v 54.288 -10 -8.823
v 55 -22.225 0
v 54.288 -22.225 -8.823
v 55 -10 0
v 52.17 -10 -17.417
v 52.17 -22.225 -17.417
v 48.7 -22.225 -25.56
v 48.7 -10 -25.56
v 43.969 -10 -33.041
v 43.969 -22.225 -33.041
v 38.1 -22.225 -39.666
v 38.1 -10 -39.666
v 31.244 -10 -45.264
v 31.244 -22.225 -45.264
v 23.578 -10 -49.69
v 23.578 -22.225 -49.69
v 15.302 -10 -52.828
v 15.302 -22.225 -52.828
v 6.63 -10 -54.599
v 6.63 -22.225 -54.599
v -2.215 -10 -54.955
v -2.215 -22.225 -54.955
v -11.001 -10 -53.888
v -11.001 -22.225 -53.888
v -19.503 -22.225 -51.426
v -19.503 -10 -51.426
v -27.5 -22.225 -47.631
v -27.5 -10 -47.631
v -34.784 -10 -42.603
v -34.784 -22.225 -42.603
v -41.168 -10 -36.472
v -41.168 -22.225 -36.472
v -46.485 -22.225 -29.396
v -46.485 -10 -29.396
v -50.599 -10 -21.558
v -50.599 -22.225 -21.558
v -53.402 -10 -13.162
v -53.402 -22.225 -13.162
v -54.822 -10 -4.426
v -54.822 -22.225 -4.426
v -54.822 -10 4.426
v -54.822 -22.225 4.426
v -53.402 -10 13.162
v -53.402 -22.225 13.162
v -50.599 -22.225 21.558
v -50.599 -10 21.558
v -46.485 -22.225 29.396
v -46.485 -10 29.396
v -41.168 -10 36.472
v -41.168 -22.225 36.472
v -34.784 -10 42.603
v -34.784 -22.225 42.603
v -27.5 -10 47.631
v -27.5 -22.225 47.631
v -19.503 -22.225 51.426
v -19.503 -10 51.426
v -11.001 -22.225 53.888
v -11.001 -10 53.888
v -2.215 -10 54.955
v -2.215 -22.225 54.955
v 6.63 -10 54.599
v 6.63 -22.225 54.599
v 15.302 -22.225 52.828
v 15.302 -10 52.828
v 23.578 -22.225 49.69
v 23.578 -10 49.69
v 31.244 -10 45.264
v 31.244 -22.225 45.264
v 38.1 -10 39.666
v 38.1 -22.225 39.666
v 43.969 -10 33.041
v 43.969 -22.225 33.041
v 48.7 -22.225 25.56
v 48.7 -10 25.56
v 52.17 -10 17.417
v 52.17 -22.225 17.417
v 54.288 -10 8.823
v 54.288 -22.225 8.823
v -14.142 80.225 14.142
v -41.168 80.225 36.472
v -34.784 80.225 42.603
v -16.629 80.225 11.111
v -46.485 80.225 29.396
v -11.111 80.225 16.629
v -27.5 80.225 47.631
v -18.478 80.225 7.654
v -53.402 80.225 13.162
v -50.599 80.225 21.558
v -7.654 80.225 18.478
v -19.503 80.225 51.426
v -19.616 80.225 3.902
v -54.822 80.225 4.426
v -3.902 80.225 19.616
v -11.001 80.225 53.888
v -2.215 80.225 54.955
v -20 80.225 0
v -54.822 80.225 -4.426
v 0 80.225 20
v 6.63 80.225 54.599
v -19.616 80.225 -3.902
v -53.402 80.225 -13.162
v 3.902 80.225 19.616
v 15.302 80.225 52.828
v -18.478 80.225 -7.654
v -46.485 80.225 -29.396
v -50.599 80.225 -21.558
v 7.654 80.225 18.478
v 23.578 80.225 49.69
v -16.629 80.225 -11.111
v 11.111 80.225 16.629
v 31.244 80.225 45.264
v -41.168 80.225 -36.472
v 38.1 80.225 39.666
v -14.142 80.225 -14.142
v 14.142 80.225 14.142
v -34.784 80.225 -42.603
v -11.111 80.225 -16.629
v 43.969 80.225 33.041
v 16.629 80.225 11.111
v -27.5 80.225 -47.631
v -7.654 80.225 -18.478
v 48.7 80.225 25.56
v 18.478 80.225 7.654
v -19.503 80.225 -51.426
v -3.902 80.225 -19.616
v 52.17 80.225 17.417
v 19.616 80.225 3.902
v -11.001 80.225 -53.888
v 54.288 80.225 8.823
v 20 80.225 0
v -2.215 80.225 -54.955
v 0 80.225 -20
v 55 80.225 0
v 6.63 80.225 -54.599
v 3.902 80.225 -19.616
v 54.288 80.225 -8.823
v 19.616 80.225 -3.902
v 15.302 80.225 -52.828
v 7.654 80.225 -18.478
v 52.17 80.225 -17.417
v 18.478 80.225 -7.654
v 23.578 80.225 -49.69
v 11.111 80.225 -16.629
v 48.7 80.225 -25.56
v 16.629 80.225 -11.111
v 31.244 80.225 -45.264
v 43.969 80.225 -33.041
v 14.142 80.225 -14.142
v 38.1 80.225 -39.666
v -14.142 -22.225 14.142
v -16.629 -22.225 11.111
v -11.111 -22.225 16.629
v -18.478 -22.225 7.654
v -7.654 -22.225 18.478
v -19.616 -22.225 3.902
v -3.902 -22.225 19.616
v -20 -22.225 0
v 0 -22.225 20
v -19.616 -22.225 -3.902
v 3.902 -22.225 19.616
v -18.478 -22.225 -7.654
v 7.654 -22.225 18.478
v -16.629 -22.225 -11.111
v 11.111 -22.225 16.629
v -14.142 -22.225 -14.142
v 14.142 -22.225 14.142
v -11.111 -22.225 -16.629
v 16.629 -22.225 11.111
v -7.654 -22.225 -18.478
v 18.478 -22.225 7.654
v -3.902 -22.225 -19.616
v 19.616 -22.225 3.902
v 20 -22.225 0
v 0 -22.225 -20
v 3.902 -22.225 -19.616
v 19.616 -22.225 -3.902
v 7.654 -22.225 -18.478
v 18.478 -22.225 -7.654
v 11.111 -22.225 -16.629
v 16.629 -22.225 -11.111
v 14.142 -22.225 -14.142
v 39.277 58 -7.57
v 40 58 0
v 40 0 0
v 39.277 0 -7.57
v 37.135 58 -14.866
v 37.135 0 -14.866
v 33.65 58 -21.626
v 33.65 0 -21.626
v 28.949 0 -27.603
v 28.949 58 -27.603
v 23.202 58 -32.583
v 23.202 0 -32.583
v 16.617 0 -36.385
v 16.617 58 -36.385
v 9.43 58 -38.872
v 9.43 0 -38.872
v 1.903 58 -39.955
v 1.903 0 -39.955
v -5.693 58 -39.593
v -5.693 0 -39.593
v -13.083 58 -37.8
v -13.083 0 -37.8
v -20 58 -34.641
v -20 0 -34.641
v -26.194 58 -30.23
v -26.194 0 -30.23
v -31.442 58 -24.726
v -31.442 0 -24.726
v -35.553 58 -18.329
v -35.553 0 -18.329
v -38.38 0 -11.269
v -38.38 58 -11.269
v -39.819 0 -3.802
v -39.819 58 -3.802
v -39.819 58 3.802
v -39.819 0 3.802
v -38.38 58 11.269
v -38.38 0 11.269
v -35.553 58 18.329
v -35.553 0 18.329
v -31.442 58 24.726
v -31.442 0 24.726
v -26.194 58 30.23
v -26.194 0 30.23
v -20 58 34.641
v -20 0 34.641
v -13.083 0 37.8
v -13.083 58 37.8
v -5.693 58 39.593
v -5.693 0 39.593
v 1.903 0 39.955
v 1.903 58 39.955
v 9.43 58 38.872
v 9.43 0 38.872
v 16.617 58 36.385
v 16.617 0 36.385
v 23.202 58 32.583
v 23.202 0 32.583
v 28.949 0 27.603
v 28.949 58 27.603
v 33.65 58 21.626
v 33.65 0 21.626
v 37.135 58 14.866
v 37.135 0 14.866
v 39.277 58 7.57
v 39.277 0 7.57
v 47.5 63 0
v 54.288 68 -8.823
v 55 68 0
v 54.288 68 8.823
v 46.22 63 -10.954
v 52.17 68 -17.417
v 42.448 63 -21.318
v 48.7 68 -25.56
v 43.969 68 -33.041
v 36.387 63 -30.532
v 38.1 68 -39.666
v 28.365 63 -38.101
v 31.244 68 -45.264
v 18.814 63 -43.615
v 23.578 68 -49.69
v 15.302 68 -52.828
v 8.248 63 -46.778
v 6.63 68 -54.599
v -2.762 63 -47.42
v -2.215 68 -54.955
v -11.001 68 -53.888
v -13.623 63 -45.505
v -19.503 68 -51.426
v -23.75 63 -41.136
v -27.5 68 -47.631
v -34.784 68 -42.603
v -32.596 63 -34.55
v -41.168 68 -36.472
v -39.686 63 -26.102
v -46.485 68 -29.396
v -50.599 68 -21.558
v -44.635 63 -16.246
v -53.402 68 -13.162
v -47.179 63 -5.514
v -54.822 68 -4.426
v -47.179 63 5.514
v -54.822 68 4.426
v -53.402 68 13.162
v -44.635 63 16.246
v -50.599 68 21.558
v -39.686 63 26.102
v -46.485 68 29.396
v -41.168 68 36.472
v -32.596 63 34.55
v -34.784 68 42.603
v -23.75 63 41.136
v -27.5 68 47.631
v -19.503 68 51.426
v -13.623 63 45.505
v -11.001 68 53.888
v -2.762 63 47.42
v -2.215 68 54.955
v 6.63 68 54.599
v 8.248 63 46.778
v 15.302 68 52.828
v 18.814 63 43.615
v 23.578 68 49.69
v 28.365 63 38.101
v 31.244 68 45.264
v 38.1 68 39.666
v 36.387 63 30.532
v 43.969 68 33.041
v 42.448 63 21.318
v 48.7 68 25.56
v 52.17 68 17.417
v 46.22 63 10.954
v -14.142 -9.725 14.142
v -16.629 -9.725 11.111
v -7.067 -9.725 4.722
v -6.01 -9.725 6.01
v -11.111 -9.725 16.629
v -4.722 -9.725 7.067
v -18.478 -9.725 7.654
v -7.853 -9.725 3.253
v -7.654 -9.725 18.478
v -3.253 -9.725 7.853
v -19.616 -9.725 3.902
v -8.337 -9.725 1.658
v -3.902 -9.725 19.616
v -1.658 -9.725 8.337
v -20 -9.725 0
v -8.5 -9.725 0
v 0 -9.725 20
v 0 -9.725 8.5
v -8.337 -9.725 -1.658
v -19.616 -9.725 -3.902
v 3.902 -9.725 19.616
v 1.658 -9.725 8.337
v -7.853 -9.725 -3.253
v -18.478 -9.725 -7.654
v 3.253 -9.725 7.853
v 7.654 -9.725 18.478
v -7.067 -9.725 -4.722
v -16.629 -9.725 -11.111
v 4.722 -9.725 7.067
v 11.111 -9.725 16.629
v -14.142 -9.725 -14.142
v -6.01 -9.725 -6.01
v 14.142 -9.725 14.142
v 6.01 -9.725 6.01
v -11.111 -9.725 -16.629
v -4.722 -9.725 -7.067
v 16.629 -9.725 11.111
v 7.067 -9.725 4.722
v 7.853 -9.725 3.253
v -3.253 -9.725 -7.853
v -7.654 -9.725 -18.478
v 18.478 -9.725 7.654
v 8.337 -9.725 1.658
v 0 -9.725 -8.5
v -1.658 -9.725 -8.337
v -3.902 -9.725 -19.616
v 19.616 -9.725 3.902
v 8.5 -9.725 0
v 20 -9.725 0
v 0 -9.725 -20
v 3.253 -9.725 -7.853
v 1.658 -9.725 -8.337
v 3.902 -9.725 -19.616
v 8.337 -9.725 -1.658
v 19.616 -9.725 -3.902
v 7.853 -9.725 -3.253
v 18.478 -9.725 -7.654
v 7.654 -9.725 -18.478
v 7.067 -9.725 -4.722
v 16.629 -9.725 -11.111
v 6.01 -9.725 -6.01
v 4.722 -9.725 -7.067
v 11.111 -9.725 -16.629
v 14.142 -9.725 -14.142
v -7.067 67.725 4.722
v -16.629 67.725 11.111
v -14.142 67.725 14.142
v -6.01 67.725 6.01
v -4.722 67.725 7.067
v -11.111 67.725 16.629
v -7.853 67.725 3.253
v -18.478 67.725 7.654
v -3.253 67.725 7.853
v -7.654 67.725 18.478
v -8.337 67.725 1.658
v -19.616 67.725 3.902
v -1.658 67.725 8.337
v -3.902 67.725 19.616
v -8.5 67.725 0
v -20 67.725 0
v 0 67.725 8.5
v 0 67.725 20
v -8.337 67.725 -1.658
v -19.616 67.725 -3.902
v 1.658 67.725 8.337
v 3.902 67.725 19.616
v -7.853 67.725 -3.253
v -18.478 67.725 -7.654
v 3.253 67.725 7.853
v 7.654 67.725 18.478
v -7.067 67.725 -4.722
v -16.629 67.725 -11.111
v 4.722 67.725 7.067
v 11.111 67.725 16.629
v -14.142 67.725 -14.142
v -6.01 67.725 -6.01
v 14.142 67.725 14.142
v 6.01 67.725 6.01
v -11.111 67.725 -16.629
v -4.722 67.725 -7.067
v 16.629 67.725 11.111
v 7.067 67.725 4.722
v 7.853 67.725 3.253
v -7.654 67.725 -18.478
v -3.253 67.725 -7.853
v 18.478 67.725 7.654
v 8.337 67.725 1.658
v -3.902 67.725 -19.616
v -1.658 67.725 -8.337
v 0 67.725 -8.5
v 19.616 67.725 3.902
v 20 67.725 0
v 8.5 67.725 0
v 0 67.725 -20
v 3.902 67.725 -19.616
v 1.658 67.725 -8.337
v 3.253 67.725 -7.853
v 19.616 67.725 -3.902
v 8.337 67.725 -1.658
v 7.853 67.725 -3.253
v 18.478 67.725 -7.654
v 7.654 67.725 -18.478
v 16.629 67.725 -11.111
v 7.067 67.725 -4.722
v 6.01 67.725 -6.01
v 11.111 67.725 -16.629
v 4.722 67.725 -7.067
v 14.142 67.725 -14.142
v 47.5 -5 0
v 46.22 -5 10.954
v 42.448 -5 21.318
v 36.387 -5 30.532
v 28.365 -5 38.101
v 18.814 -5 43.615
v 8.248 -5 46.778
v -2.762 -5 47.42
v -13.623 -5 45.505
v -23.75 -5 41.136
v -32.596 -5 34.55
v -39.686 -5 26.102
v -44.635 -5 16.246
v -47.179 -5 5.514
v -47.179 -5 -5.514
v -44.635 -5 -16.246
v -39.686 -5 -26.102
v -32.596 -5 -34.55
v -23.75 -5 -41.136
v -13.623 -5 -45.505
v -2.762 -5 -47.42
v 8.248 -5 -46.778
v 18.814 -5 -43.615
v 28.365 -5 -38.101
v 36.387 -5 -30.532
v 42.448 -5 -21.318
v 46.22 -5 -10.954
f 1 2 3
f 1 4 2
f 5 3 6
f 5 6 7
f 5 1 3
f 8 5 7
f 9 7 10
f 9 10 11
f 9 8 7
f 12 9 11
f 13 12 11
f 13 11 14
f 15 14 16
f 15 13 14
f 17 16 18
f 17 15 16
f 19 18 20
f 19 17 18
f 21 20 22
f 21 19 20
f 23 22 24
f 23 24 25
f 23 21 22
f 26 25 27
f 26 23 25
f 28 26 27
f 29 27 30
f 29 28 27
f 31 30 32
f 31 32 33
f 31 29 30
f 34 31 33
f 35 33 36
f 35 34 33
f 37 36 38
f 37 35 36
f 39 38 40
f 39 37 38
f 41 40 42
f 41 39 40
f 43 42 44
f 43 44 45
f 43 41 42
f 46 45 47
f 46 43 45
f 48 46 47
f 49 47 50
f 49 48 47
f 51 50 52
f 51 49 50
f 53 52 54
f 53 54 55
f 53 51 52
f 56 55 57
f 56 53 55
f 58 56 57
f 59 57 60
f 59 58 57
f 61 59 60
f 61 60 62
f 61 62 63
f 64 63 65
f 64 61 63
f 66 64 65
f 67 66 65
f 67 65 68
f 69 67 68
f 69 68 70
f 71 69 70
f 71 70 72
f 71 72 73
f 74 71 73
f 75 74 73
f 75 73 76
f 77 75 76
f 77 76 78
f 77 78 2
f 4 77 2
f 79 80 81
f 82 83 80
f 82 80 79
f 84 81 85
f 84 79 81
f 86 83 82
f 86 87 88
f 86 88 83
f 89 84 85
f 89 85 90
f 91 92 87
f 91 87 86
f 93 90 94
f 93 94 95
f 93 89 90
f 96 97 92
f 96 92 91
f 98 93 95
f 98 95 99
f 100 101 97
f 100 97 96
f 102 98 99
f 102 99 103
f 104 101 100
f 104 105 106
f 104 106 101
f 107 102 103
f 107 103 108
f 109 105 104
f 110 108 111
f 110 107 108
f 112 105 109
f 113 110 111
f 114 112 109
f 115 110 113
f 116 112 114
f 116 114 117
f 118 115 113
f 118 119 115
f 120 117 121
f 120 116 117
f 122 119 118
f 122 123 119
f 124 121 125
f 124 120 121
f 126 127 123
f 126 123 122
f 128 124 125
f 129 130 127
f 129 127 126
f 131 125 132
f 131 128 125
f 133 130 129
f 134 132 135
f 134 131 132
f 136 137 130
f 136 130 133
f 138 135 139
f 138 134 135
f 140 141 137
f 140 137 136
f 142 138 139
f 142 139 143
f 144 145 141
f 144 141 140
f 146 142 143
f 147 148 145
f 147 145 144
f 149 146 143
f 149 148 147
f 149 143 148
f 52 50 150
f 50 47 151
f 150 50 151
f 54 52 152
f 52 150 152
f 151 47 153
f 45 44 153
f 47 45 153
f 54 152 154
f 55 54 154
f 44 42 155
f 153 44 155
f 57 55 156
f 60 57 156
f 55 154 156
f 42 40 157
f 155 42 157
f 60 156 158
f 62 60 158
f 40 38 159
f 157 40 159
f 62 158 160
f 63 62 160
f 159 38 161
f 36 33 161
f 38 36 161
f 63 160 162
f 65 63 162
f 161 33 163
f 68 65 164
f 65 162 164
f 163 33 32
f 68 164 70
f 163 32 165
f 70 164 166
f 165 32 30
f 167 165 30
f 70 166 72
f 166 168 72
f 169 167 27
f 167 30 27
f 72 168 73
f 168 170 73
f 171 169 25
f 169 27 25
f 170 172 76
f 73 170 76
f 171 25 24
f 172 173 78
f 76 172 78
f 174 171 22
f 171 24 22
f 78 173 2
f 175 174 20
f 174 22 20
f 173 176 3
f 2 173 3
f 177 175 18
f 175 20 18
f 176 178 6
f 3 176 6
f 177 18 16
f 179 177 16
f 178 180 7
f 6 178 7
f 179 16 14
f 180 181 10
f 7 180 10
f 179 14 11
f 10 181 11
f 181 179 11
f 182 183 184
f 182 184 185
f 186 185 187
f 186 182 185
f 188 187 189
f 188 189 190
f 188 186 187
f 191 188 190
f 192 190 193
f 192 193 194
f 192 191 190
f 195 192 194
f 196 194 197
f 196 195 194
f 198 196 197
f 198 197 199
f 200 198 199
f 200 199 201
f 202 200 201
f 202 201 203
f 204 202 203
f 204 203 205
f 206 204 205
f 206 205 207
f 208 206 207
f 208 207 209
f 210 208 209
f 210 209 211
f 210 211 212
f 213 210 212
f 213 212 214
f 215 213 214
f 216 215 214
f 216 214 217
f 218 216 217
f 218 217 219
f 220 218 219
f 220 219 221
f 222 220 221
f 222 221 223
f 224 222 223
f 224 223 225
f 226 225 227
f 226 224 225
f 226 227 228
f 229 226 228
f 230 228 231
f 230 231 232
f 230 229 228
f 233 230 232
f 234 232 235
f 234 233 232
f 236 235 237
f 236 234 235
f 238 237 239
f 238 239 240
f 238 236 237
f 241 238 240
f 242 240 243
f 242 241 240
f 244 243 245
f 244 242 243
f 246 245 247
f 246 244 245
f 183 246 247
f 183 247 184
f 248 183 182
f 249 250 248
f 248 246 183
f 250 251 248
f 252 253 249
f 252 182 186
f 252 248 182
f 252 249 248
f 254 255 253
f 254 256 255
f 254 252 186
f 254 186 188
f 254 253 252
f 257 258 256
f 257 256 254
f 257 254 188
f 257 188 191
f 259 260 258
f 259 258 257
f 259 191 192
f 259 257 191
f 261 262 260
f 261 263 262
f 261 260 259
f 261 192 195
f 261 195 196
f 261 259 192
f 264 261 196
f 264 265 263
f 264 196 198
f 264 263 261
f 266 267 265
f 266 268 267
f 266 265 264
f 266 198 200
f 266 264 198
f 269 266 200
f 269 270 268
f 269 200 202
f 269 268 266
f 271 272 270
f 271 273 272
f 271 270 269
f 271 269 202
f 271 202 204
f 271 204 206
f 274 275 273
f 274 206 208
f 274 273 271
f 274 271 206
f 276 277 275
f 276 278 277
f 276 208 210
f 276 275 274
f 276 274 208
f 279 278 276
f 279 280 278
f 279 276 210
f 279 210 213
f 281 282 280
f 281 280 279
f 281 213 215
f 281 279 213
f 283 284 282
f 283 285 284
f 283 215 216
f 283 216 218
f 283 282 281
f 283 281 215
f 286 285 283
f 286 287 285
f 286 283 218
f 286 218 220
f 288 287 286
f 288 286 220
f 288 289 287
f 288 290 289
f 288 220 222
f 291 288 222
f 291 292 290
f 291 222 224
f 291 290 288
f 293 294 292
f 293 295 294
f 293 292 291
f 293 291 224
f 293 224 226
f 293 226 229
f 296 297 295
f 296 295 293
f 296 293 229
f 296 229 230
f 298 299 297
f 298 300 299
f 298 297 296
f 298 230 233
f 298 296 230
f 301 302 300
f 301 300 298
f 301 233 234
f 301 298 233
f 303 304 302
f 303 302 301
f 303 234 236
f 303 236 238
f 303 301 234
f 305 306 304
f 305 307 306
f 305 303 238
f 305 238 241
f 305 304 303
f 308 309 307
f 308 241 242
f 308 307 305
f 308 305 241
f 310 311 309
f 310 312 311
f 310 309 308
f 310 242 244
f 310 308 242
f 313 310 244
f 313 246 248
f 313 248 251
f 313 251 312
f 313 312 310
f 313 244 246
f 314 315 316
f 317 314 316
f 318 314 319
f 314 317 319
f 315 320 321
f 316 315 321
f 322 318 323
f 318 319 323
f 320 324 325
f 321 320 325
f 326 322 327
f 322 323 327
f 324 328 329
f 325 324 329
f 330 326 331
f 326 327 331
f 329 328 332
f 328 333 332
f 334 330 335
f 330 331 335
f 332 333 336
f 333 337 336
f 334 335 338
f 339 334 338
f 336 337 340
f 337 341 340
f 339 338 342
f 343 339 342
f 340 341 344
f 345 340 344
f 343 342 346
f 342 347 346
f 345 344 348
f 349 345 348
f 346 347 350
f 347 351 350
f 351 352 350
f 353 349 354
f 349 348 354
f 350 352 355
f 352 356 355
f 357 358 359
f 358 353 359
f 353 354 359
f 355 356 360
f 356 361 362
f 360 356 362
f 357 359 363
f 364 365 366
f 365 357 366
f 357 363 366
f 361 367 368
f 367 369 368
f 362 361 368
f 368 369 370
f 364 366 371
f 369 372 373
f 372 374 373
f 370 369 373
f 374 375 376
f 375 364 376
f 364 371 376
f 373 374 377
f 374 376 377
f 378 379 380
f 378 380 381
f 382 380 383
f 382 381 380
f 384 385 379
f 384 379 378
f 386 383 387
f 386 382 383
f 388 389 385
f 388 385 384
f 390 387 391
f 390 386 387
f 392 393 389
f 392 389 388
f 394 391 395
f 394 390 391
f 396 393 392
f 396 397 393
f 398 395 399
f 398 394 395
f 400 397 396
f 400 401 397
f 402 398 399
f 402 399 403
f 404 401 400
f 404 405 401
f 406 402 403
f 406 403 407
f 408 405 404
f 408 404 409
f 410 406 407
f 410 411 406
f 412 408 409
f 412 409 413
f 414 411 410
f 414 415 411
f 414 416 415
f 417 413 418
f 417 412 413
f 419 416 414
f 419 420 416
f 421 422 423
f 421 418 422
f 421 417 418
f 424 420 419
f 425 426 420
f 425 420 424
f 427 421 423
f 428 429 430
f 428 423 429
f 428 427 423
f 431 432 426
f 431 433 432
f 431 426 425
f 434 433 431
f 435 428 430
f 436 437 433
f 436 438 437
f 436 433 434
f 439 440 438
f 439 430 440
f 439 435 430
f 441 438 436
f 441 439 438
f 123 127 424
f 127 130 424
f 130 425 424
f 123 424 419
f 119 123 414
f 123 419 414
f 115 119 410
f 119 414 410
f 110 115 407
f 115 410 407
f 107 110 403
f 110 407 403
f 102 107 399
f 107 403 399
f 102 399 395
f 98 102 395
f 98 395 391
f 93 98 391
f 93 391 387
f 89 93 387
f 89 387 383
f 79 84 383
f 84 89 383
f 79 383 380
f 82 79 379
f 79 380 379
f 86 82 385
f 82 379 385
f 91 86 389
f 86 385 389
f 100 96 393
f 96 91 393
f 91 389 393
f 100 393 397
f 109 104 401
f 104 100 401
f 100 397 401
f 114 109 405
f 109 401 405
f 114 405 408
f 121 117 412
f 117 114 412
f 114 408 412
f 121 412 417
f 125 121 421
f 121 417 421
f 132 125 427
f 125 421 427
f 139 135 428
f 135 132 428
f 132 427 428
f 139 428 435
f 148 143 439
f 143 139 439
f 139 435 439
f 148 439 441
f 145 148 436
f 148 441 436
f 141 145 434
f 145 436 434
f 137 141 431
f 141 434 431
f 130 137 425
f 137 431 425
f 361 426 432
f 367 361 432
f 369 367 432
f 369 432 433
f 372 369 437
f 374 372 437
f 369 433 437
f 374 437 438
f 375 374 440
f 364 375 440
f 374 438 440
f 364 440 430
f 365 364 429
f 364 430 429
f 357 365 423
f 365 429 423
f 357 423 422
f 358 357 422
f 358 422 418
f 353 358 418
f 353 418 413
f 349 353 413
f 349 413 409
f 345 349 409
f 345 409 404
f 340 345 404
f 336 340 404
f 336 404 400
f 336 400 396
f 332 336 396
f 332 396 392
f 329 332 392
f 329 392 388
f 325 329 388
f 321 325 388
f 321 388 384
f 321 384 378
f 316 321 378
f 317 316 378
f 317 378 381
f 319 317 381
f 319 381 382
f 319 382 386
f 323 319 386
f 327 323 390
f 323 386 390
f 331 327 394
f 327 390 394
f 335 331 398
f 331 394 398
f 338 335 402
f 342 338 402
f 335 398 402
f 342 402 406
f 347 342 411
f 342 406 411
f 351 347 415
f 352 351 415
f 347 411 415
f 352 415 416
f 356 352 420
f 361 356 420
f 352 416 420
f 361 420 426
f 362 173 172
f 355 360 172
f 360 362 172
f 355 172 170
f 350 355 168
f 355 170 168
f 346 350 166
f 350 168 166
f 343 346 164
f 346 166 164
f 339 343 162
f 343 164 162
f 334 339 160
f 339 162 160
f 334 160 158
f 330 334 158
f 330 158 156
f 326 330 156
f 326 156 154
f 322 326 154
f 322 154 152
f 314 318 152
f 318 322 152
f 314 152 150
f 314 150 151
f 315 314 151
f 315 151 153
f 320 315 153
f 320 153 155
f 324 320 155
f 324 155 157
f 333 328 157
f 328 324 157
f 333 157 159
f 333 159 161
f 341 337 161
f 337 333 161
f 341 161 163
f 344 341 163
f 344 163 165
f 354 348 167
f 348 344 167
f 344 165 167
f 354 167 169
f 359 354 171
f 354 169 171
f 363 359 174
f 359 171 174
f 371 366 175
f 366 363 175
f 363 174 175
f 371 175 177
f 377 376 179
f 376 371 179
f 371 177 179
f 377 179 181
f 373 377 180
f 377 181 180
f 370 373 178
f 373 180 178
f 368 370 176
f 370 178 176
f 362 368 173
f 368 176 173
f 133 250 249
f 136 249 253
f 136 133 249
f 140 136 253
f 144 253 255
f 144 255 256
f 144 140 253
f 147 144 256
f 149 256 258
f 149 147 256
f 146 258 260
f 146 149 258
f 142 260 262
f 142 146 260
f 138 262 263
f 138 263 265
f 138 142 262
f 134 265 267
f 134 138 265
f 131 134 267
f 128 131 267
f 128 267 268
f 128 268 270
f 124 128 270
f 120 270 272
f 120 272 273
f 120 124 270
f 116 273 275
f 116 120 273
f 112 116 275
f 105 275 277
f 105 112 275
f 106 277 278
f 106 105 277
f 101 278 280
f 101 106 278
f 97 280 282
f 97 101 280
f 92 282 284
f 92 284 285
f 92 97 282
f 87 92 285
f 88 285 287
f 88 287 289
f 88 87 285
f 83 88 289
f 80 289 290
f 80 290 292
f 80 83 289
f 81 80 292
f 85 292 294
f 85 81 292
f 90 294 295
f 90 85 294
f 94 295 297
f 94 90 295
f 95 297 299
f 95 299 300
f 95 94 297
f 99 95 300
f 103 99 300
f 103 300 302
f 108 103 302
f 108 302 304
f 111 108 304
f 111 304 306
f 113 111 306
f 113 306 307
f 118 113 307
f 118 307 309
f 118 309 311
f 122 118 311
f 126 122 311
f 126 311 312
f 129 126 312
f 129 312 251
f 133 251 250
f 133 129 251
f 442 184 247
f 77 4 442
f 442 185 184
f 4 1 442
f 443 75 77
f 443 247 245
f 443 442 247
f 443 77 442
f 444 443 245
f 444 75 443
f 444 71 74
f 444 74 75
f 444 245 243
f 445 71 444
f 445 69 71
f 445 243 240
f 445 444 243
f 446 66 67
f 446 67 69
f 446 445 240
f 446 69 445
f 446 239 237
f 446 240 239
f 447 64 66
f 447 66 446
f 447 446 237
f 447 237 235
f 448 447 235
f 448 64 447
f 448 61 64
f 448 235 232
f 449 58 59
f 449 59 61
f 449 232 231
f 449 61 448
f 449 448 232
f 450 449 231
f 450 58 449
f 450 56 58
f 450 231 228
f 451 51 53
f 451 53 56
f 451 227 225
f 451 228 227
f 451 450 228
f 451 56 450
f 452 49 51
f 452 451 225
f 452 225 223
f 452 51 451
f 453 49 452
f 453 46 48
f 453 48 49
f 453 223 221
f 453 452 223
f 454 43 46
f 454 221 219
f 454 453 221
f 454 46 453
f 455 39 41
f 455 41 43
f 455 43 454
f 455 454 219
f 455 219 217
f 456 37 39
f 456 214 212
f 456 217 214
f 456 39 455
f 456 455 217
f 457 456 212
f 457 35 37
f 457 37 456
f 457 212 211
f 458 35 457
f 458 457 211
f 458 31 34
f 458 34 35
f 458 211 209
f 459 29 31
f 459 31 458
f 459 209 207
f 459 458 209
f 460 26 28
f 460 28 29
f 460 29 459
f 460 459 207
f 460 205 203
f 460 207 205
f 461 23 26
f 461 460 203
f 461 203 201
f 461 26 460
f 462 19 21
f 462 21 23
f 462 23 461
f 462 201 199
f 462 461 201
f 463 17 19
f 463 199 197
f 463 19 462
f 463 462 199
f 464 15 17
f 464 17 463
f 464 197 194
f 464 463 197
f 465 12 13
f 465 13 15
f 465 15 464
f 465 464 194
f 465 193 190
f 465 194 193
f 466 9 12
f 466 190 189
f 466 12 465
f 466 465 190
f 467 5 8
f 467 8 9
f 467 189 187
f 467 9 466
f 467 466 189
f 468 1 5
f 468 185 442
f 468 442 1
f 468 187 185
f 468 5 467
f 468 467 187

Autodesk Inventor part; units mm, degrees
ref_plane "YZ Plane" through (0, 0, 0) normal (1, 0, 0) x (0, 1, 0)
ref_plane "XZ Plane" through (0, 0, 0) normal (0, 1, 0) x (-1, 0, 0)
ref_plane "XY Plane" through (0, 0, 0) normal (0, 0, 1) x (1, 0, 0)
sketch "Sketch1" plane through (0, 0, 0) normal (0, 0, 1) x (1, 0, 0)
  line L0 (0, 0) -> (0, 58)
  line L1 (0, 58) -> (20, 58)
  line L2 (20, 58) -> (20, 0)
  line L3 (20, 0) -> (0, 0)
  line L4 (40, 0) -> (40, 58)
  line L5 (40, 58) -> (55, 68)
  line L6 (55, 68) -> (55, 80.225)
  line L7 (55, 80.225) -> (20, 80.225)
  line L8 (20, 80.225) -> (20, -22.225)
  line L9 (20, -22.225) -> (55, -22.225)
  line L10 (55, -22.225) -> (55, -10)
  line L11 (55, -10) -> (40, 0)
  line L12 (20, 0) -> (8.5, 0)
  line L13 (8.5, 0) -> (8.5, 58)
  line L14 (8.5, 58) -> (20, 58)
  line L15 (20, 58) -> (20, 0)
  line L16 (8.5, -9.725) -> (20, -9.725)
  line L17 (20, -9.725) -> (20, 67.725)
  line L18 (20, 67.725) -> (8.5, 67.725)
  line L19 (8.5, 67.725) -> (8.5, -9.725)
  dimension "d0" = 58
  dimension "d1" = 20
  dimension "d9" = 12.225
  dimension "d10" = 10
  dimension "d14" = 8.5
  dimension "d15" = 102.45
  dimension "d16" = 77.45
  dimension "d17" = 12.5
  dimension "d18" = 35
  dimension "d19" = 40
  dimension "d20" = 35
  dimension "d21" = 12.225
  dimension "d22" = 10
revolve "Revolution1" add sketch "Sketch1" angle 360 about axis through (0, 0, 0) along (0, 1, 0) contours L13 L1 L2 L3 | L3 L8 L16 L19 | L19 L18 L8 L1 | L2 L8 L7 L6 L5 L4 L11 L10 L9
ref_plane "Work Plane1" through (0, 29, 0) normal (0, -1, 0) x (1, 0, 0)
equation "\"d9\" = d5"
equation "\"d10\" = d7"
equation "\"d17\" = -0.5 * d16 + 0.5 * d15"
equation "\"d20\" = d18"
equation "\"d21\" = d9"
equation "\"d5\" = 12.225"
equation "\"d7\" = 10"
properties part number "1219_Middle Roller_V1" material "Wood (Maple)"
